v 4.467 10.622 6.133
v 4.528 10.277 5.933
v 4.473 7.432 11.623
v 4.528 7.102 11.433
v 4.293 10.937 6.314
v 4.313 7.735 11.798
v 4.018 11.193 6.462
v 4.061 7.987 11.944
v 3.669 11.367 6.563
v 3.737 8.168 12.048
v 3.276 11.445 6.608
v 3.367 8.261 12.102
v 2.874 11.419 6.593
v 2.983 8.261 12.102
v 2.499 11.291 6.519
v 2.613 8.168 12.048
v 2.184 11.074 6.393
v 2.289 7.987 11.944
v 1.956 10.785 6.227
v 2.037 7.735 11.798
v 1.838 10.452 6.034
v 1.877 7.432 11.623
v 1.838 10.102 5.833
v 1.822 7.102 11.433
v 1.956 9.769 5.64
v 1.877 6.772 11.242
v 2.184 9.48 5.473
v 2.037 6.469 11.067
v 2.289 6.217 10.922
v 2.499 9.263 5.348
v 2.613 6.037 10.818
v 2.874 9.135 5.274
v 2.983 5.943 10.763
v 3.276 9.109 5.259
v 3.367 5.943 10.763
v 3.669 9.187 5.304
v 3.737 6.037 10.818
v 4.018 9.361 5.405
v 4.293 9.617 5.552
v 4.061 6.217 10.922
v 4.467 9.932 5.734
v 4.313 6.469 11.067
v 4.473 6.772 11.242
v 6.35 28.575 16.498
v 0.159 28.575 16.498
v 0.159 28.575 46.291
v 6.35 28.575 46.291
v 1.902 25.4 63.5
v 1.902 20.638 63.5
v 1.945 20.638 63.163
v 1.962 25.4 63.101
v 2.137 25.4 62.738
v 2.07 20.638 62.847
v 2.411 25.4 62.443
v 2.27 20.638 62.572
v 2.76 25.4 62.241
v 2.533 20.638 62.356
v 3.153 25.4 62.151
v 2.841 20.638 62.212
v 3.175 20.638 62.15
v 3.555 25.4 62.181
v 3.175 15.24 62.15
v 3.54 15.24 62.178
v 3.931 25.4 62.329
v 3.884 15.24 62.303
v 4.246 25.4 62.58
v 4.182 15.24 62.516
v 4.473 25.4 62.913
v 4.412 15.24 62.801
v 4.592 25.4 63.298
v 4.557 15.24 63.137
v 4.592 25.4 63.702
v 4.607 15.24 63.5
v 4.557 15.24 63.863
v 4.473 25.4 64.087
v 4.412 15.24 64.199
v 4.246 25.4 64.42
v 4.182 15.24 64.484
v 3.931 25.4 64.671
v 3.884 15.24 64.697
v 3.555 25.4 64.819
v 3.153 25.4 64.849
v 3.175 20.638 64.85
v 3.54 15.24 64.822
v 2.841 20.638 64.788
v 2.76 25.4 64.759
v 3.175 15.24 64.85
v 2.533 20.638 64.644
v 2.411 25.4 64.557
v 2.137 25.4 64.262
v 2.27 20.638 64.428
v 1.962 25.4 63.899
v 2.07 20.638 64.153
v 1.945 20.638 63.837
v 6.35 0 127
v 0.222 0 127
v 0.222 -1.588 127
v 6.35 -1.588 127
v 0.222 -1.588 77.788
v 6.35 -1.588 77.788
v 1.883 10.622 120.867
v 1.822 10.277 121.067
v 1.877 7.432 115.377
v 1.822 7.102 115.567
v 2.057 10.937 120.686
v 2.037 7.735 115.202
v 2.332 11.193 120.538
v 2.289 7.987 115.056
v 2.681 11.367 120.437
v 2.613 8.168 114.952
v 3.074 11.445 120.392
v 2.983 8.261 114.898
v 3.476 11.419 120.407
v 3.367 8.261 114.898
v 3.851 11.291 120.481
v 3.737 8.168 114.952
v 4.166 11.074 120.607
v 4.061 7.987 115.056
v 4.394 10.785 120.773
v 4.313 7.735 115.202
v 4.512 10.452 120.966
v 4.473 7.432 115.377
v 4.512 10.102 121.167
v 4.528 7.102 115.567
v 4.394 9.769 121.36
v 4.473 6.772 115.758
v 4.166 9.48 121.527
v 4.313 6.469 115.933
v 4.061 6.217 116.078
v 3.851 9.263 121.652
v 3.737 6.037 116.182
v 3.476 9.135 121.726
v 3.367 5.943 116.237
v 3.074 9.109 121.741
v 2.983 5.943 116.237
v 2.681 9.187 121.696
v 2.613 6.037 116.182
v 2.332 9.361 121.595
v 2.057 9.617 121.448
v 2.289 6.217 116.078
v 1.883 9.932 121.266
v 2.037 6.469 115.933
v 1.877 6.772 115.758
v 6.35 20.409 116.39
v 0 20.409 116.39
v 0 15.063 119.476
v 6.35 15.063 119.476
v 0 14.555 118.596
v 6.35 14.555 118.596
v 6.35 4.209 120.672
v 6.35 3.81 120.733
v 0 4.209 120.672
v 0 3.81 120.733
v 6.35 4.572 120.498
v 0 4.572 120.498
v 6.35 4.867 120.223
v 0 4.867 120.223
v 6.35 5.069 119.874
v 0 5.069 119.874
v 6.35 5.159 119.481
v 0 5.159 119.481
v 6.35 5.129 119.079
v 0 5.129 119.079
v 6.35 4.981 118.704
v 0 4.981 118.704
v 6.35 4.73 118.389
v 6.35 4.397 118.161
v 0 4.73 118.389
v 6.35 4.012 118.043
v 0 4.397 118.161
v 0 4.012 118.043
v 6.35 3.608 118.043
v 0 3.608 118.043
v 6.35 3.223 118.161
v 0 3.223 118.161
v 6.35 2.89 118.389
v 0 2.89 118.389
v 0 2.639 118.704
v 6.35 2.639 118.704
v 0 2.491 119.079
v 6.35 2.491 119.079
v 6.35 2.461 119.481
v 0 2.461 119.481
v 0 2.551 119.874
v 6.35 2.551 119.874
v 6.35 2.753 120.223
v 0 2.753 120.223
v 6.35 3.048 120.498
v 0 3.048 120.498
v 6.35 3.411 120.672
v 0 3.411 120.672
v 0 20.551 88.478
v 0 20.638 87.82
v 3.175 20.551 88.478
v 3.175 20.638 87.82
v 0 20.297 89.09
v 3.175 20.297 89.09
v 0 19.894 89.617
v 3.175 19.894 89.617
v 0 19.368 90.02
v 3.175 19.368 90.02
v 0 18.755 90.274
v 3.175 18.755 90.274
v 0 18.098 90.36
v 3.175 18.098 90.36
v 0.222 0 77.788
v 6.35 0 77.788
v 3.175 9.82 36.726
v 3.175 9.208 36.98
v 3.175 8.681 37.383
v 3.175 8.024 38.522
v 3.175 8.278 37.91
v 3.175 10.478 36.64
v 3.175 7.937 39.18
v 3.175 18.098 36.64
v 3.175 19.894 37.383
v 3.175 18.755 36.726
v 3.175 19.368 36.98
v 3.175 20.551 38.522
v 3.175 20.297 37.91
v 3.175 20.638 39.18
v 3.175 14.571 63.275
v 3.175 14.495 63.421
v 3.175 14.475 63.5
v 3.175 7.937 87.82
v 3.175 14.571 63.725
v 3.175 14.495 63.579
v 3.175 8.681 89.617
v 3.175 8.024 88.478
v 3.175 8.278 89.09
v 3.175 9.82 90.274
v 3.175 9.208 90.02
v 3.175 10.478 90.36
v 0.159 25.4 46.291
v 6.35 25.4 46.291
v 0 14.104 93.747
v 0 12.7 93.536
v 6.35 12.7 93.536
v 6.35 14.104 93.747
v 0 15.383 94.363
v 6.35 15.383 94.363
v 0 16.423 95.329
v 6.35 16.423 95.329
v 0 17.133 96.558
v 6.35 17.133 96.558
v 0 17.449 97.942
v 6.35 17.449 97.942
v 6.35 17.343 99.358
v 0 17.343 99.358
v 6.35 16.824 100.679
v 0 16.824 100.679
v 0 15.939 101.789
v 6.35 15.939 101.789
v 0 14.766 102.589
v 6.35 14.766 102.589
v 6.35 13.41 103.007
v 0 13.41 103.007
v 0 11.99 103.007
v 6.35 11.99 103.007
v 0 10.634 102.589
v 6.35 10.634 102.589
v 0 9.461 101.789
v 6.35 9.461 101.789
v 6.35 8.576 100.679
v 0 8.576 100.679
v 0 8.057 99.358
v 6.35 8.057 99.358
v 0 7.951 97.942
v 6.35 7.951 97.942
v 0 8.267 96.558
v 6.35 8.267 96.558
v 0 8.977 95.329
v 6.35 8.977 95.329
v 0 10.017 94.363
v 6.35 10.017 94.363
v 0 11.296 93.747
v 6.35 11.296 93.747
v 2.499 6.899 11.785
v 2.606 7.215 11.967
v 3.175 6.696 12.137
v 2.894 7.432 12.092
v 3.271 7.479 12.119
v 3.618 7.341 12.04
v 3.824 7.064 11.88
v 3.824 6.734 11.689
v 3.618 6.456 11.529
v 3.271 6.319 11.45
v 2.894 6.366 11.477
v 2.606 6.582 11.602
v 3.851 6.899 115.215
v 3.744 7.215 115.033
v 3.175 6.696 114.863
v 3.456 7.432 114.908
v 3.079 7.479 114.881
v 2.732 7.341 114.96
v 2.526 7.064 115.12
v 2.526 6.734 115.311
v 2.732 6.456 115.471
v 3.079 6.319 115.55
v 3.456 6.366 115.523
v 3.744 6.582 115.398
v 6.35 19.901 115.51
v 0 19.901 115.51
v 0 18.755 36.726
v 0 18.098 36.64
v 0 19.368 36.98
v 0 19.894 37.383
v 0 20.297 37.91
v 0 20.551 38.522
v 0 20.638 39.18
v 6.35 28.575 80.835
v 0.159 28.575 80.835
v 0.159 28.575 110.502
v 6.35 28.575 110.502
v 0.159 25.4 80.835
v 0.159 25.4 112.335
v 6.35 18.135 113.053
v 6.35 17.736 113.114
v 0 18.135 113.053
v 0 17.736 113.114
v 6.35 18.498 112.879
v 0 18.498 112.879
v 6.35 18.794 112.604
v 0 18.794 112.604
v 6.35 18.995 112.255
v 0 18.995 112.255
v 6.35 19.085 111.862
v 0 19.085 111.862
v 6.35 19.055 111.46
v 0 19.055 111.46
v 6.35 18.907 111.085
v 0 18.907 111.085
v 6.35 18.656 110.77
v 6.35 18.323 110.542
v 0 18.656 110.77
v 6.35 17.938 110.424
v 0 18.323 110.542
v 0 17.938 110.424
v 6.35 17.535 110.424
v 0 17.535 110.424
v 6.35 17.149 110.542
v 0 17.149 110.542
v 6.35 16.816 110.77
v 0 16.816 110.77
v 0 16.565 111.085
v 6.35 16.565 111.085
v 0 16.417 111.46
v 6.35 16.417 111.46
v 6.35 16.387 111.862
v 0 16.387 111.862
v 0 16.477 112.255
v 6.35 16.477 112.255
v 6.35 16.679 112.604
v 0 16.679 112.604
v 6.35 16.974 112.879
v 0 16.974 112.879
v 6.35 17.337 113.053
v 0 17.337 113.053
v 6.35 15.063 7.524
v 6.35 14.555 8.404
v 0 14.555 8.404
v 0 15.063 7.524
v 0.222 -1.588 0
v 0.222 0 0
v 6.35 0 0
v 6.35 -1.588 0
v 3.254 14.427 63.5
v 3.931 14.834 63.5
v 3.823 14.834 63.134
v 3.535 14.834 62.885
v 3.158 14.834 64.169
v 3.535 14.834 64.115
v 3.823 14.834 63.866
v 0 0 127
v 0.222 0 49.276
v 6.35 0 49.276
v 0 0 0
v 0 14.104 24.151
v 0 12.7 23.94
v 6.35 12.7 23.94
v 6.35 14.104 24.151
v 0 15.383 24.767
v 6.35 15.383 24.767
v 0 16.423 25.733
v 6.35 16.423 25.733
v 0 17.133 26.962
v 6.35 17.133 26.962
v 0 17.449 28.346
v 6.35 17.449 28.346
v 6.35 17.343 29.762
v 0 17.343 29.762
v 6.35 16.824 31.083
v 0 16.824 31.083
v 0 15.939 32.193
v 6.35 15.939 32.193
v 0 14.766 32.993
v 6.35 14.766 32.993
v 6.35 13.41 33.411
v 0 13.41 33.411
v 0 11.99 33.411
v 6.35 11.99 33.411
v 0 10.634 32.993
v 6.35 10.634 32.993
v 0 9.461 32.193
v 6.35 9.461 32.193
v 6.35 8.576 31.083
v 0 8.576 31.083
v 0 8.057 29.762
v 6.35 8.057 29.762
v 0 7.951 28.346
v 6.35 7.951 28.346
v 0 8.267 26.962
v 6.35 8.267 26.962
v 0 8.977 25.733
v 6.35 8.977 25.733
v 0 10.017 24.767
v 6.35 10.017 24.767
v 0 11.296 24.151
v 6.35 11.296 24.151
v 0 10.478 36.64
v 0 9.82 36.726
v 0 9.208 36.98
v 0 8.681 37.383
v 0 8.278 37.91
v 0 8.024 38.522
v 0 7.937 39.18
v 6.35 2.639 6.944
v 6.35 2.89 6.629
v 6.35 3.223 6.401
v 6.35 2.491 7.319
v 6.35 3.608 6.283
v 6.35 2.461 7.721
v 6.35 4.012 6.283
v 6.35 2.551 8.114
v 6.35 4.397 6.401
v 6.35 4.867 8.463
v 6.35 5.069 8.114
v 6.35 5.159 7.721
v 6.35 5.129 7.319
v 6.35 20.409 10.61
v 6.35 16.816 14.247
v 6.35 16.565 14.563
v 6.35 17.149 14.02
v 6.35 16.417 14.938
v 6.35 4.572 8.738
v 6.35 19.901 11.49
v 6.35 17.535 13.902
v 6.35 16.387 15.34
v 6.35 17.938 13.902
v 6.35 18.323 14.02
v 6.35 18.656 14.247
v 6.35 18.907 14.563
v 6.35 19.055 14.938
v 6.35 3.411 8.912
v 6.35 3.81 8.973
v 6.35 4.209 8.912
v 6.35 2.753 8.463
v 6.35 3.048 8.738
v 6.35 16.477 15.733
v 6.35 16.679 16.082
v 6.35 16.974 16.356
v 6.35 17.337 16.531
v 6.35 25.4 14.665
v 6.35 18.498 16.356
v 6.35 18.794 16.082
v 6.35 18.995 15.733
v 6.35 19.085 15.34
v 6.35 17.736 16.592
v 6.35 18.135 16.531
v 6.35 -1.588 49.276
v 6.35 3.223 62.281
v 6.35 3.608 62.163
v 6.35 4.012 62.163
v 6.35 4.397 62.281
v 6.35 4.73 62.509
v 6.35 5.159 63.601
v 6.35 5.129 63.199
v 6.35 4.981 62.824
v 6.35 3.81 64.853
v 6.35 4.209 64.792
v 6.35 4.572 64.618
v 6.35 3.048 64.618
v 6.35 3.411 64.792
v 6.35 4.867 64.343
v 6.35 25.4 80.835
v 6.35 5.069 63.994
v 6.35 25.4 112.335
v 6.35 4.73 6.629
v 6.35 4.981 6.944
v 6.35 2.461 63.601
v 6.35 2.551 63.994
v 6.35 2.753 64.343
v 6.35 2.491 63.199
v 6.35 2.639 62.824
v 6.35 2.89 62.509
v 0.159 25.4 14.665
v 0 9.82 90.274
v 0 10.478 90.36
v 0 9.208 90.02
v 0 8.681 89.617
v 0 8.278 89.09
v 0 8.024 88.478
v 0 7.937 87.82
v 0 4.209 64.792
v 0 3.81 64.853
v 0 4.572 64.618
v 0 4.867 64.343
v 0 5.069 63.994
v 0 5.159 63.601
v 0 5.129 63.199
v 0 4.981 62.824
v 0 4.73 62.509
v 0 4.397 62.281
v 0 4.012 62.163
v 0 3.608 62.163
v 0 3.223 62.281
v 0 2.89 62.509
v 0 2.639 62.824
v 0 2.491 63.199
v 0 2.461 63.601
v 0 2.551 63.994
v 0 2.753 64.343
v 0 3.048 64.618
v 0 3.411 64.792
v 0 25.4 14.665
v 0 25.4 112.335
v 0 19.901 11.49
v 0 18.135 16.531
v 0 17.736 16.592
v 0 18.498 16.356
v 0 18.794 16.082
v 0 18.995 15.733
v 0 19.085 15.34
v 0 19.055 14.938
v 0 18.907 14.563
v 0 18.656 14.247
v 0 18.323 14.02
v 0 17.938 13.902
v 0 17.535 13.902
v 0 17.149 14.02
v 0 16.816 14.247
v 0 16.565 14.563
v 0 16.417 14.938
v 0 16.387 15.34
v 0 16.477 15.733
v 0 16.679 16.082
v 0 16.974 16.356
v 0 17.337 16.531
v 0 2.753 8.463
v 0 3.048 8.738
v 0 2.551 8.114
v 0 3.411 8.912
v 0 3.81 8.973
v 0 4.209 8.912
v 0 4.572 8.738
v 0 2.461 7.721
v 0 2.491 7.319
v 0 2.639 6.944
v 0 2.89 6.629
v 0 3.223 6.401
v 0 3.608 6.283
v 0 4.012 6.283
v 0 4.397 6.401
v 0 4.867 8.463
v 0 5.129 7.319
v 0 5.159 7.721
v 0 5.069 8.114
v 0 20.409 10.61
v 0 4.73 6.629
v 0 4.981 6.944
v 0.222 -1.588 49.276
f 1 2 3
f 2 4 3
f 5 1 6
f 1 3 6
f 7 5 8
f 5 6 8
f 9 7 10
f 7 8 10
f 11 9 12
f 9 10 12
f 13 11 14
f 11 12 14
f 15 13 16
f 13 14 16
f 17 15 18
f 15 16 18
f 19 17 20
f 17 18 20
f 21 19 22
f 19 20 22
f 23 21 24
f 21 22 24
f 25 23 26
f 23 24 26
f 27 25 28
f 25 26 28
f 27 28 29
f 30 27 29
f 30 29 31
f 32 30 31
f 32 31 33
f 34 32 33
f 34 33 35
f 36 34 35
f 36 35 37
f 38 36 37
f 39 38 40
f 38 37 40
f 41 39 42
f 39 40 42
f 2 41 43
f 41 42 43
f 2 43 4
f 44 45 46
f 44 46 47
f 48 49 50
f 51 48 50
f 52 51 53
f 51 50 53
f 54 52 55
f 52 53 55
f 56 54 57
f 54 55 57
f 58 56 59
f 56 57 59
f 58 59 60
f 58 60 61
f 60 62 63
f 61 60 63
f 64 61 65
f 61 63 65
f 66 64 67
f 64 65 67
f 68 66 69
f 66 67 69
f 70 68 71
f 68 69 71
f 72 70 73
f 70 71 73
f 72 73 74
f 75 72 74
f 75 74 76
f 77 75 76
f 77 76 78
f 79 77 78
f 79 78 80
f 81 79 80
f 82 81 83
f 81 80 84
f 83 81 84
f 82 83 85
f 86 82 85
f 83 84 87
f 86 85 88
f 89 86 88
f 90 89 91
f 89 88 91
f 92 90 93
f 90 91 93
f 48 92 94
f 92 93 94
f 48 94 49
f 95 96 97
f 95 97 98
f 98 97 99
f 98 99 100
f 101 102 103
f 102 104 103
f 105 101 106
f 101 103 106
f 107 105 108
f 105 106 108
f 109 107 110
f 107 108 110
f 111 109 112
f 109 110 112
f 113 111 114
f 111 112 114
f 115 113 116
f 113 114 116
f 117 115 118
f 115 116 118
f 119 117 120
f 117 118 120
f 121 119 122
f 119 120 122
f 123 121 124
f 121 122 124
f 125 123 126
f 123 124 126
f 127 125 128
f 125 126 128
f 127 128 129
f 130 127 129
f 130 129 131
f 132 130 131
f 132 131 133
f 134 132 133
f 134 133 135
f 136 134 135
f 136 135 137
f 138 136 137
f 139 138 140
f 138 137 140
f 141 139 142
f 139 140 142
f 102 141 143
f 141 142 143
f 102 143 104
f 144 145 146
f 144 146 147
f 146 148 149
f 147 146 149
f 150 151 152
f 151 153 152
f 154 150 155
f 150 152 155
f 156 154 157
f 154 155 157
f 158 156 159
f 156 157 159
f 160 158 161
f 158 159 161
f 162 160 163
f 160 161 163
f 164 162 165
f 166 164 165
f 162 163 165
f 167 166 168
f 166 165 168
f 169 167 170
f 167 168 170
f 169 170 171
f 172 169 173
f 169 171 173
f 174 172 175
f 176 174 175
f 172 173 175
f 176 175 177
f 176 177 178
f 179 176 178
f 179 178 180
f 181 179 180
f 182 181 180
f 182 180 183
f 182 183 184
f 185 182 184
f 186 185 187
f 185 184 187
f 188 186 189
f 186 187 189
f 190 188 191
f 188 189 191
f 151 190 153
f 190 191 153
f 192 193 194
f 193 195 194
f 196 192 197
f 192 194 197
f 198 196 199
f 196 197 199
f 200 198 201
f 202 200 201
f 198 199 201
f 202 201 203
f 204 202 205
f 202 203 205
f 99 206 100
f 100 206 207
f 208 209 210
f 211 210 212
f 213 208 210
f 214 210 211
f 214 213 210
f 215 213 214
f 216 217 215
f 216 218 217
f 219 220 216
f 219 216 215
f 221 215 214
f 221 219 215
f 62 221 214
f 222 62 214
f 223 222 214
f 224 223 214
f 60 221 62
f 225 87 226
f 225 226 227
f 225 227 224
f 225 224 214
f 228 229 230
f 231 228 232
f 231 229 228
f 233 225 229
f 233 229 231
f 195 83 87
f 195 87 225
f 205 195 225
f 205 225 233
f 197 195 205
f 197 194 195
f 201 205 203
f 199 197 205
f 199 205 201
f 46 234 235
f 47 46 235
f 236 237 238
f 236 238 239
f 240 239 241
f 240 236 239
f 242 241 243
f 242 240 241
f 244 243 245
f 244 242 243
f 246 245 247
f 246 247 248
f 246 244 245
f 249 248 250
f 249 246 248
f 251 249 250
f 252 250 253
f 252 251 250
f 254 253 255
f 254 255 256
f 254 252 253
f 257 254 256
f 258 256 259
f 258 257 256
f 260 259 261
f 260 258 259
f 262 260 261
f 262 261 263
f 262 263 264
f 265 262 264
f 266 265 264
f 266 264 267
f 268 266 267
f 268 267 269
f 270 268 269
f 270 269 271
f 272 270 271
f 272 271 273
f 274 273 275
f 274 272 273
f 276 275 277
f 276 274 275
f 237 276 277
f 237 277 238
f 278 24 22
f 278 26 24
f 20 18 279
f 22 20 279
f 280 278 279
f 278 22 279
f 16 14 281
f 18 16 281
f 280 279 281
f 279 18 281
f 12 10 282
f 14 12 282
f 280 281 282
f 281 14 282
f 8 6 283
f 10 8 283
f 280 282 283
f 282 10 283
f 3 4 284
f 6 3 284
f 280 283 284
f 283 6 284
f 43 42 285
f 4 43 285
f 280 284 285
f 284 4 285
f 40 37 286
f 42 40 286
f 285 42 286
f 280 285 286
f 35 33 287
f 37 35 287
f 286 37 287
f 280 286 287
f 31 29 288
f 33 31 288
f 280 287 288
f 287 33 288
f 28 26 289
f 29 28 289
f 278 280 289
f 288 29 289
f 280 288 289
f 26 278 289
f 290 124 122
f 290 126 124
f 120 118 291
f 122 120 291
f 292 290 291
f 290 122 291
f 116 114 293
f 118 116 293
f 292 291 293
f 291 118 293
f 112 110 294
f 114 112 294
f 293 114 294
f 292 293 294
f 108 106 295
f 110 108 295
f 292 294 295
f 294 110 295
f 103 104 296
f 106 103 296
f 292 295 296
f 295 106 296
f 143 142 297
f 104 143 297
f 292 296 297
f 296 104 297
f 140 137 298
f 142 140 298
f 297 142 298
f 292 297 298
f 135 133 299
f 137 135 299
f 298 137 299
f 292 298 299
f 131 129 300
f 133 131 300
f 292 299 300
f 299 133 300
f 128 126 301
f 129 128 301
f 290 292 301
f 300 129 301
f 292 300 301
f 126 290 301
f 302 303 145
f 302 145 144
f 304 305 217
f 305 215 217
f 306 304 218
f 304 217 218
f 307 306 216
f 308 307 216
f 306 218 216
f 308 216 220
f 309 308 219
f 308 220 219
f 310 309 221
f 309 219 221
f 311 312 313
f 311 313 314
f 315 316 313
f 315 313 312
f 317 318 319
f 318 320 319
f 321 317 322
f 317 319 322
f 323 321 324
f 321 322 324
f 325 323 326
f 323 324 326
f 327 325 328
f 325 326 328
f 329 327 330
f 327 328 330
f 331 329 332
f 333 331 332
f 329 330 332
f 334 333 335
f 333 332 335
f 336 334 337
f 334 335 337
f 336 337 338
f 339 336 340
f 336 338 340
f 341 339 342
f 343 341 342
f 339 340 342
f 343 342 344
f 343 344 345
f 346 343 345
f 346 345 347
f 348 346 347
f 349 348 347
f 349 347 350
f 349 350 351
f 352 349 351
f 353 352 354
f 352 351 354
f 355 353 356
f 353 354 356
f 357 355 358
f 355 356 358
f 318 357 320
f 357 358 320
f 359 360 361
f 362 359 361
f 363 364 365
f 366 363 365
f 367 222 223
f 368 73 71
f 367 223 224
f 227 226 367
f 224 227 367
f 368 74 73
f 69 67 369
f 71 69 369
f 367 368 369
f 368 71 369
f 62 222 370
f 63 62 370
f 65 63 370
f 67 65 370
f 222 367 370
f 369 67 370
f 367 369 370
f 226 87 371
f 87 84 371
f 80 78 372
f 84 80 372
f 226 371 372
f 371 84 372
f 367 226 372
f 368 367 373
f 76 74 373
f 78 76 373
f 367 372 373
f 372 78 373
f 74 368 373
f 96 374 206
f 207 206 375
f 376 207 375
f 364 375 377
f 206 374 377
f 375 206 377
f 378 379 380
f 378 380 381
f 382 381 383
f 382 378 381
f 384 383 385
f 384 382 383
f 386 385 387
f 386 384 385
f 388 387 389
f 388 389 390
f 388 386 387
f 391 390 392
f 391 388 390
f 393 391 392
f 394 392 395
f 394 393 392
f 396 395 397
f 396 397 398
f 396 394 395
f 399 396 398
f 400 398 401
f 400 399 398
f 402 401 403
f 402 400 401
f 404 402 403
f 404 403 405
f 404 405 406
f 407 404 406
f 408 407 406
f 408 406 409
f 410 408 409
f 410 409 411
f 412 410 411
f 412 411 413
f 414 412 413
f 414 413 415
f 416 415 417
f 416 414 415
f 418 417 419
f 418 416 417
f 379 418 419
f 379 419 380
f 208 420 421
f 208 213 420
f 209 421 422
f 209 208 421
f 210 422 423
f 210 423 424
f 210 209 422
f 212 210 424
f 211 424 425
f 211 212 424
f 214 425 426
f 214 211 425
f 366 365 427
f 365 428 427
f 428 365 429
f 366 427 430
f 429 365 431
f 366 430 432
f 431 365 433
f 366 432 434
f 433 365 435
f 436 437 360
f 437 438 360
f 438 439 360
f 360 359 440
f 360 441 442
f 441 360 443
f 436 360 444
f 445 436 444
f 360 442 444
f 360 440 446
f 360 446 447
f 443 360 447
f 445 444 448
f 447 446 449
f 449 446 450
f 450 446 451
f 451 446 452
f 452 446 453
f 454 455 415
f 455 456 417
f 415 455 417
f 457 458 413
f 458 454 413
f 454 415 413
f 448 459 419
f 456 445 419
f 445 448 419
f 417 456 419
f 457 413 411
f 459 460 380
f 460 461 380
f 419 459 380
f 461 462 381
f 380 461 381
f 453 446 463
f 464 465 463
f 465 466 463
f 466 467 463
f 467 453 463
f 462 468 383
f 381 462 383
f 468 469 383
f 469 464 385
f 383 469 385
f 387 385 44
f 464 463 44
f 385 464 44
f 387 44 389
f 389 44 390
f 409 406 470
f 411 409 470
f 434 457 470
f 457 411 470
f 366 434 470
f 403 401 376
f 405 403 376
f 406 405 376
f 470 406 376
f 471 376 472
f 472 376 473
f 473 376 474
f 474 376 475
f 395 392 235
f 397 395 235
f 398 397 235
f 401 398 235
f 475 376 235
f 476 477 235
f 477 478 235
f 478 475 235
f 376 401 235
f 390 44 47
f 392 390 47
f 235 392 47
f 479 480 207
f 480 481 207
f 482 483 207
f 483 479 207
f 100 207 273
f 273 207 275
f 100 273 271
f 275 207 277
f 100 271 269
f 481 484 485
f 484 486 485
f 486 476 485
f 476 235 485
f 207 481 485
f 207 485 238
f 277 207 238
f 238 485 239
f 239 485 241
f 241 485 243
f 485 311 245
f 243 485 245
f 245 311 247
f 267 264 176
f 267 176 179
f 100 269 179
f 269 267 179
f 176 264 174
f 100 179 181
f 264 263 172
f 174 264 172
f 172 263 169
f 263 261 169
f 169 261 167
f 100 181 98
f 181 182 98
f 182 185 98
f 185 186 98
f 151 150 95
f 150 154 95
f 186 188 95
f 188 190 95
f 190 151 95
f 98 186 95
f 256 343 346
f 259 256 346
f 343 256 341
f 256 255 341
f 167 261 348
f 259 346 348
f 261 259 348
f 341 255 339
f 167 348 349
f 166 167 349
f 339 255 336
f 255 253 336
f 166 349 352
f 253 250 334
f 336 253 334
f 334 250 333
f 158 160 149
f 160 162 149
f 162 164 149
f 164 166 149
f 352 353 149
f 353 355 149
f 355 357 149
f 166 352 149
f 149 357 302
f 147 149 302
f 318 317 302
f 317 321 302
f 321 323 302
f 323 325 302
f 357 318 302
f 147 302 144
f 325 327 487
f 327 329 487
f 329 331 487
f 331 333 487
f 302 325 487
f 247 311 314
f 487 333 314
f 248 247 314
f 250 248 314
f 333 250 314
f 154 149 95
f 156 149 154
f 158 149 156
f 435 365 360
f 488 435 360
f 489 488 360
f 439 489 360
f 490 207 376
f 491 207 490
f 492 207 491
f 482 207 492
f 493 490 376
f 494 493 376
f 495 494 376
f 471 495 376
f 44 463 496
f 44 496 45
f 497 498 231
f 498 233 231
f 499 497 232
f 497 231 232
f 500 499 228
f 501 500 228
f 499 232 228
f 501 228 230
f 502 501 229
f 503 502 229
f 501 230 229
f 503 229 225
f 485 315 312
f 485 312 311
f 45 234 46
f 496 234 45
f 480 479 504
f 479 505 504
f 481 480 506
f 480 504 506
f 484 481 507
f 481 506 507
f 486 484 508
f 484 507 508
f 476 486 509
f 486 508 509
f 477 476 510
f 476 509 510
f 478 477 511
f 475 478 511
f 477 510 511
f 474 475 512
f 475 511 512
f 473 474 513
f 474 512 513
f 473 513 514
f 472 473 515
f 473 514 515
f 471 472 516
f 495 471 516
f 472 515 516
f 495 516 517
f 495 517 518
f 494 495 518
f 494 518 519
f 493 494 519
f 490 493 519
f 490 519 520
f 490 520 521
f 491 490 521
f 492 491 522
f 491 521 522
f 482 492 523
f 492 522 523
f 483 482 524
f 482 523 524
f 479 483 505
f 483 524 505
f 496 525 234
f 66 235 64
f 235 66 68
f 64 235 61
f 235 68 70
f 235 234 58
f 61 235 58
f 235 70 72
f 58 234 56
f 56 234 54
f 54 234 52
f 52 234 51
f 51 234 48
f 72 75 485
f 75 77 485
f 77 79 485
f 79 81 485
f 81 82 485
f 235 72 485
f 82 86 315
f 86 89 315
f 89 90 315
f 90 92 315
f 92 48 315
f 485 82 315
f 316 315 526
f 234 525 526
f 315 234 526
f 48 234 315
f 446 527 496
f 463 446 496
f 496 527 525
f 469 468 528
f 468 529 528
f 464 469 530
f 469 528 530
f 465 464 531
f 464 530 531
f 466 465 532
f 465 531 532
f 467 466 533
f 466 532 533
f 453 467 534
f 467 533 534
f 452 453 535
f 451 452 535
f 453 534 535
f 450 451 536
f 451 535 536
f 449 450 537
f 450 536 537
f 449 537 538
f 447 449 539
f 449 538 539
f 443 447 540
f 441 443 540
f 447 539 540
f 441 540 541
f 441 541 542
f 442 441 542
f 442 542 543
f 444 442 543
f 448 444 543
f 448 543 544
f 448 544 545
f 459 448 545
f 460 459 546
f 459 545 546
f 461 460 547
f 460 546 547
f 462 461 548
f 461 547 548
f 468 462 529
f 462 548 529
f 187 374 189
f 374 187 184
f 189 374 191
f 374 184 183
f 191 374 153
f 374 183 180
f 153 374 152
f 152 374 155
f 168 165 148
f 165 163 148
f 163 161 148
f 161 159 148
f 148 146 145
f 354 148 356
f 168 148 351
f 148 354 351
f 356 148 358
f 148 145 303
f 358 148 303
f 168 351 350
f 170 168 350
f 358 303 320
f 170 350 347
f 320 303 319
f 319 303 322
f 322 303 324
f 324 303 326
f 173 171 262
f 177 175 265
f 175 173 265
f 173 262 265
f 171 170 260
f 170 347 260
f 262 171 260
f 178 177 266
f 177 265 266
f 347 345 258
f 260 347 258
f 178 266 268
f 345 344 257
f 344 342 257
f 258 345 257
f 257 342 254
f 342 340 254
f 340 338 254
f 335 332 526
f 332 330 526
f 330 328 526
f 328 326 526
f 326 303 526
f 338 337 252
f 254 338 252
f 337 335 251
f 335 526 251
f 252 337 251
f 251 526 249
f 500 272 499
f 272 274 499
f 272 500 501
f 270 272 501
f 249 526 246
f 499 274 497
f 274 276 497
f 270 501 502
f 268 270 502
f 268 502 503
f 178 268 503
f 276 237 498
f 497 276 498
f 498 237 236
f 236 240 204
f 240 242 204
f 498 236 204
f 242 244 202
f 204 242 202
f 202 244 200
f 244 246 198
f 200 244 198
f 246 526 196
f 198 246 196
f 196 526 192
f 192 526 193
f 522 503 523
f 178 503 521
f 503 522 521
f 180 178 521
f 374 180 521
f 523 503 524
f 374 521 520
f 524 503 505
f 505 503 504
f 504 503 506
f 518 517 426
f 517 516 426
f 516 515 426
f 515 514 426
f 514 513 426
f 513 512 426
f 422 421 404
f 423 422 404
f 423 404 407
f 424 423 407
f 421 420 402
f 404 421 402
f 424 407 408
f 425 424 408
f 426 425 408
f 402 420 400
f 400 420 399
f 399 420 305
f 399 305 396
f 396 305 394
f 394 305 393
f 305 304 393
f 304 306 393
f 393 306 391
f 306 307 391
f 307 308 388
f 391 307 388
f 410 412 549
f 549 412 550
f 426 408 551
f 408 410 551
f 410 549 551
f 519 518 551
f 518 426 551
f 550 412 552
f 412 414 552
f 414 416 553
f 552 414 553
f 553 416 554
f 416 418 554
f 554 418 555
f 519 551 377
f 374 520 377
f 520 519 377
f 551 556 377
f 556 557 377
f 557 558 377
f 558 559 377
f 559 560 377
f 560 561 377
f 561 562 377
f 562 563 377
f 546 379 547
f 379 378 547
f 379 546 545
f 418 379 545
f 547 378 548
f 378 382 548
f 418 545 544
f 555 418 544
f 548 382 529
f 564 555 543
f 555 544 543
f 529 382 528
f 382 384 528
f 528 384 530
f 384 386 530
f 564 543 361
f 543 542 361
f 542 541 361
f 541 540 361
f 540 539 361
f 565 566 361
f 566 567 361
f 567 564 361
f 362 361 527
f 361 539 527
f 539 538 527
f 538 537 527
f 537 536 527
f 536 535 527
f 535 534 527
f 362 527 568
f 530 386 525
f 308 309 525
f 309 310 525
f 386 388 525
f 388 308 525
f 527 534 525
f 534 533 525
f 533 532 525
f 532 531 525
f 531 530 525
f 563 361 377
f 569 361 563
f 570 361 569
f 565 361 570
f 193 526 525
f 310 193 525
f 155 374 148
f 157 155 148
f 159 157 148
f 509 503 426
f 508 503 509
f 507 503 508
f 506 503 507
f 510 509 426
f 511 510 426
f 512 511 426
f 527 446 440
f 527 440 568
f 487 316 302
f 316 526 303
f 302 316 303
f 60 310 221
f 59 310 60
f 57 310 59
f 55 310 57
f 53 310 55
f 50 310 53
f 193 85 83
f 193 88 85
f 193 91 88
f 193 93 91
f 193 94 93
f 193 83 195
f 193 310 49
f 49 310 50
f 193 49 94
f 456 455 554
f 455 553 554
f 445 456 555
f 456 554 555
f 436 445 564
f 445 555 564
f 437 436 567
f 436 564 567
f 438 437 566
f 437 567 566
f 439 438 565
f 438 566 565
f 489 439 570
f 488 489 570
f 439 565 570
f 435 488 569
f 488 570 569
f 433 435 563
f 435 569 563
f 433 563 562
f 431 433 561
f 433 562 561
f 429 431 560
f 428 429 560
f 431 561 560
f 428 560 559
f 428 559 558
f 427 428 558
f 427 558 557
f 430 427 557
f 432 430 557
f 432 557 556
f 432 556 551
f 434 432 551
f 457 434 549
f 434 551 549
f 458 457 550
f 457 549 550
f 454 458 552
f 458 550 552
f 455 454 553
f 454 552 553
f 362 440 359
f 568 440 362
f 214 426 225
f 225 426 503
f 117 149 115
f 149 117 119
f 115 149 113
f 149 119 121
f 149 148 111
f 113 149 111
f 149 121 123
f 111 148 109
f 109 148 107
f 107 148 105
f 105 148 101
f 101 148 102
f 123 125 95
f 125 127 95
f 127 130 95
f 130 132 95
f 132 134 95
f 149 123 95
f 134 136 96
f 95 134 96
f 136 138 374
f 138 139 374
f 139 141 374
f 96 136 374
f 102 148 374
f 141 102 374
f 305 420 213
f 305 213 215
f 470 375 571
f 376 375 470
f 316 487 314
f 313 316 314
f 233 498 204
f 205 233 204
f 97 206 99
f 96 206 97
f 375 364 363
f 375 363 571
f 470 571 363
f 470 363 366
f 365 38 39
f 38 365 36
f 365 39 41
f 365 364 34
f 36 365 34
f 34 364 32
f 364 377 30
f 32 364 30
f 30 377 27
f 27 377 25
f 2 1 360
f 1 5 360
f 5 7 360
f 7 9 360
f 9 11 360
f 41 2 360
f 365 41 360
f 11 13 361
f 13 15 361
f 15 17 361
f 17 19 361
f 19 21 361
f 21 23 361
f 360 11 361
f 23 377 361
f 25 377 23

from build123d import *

# Parameters (mm, degrees)
SKETCH1_R                     = 4.7625
BOSS_EXTRUDE1_DEPTH           = 6.35
SKETCH7_W                     = 6.35
SKETCH7_H                     = 6.1722
BOSS_EXTRUDE2_DEPTH           = 1.016
SKETCH8_W                     = 6.35
SKETCH8_H                     = 6.1722
BOSS_EXTRUDE3_DEPTH           = 1.016
TAP_DRILL_FOR_6_32_TAP1_D     = 2.7051
TAP_DRILL_FOR_6_32_TAP1_DEPTH = 6.35
TAP_DRILL_FOR_6_32_TAP1_TIP   = 0.81269403
TAP_DRILL_FOR_6_32_TAP2_D     = 2.7051
TAP_DRILL_FOR_6_32_TAP2_DEPTH = 6.35
TAP_DRILL_FOR_6_32_TAP2_TIP   = 0.81269403
TAP_DRILL_FOR_6_32_TAP3_D     = 2.7051
TAP_DRILL_FOR_6_32_TAP3_DEPTH = 6.35
TAP_DRILL_FOR_6_32_TAP3_TIP   = 0.81269403
SKETCH18_W                    = 53.721
SKETCH18_H                    = 12.7
CUT_EXTRUDE1_DEPTH            = 3.175
FILLET1_R                     = 2.54
SKETCH19_W                    = 6.19125
SKETCH19_H                    = 31.625875518
SKETCH19_H_2                  = 31.500730808
BOSS_EXTRUDE4_DEPTH           = 3.175
CUT_EXTRUDE2_DEPTH            = 131.329786024
TAP_DRILL_FOR_6_32_TAP4_D     = 2.7051
TAP_DRILL_FOR_6_32_TAP4_DEPTH = 10.16
TAP_DRILL_FOR_6_32_TAP4_TIP   = 0.81269403
SKETCH23_W                    = 6.12775
SKETCH23_H                    = 49.2125
SKETCH23_H_2                  = 49.276
BOSS_EXTRUDE5_DEPTH           = 1.5875


with BuildPart() as part:
    # Sketch1 → Boss-Extrude1 (new body)
    with BuildSketch(Plane(origin=(0, 0, 0), x_dir=(0, 0, -1), z_dir=(1, 0, 0))):
        Polygon((0, 0), (-14.664696837, 25.4), (-112.335303163, 25.4), (-127, 0), align=None)
        with Locations((-98.298, 12.7)):
            Circle(SKETCH1_R, mode=Mode.SUBTRACT)
        with Locations((-28.702, 12.7)):
            Circle(SKETCH1_R, mode=Mode.SUBTRACT)
    extrude(amount=BOSS_EXTRUDE1_DEPTH)

    # Sketch7 → Boss-Extrude2 (add)
    with BuildSketch(Plane(origin=(0, 0, 0), x_dir=(-1, 0, 0), z_dir=(0, 0.499999999999998, -0.8660254037844397))):
        with Locations((-3.175, 19.893293675)):
            Rectangle(SKETCH7_W, SKETCH7_H)
    extrude(amount=BOSS_EXTRUDE2_DEPTH)

    # Sketch8 → Boss-Extrude3 (add)
    with BuildSketch(Plane(origin=(0, 54.99261314, 95.25), x_dir=(1, 0, 0), z_dir=(0, 0.500000000000004, 0.8660254037844365))):
        with Locations((3.175, -43.606706325)):
            Rectangle(SKETCH8_W, SKETCH8_H)
    extrude(amount=BOSS_EXTRUDE3_DEPTH)

    # Tap Drill for #6-32 Tap1
    with Locations(Plane(origin=(6.35, 0, 0), x_dir=(0, 0, -1), z_dir=(1, 0, 0))):
        with Locations((-111.761034973, 17.736097687), (-15.238965027, 17.736097687), (-119.38, 3.81), (-7.62, 3.81), (-63.5, 3.81)):
            Hole(TAP_DRILL_FOR_6_32_TAP1_D / 2, depth=TAP_DRILL_FOR_6_32_TAP1_DEPTH)
            with Locations((0, 0, -(TAP_DRILL_FOR_6_32_TAP1_DEPTH + TAP_DRILL_FOR_6_32_TAP1_TIP / 2))):  # 118° drill point
                Cone(0, TAP_DRILL_FOR_6_32_TAP1_D / 2, TAP_DRILL_FOR_6_32_TAP1_TIP, mode=Mode.SUBTRACT)

    # Tap Drill for #6-32 Tap2
    with Locations(Plane(origin=(0, 54.99261314, 95.25), x_dir=(1, 0, 0), z_dir=(0, 0.500000000000004, 0.8660254037844365))):
        with Locations((3.175, -51.633106325)):
            Hole(TAP_DRILL_FOR_6_32_TAP2_D / 2, depth=TAP_DRILL_FOR_6_32_TAP2_DEPTH)
            with Locations((0, 0, -(TAP_DRILL_FOR_6_32_TAP2_DEPTH + TAP_DRILL_FOR_6_32_TAP2_TIP / 2))):  # 118° drill point
                Cone(0, TAP_DRILL_FOR_6_32_TAP2_D / 2, TAP_DRILL_FOR_6_32_TAP2_TIP, mode=Mode.SUBTRACT)

    # Tap Drill for #6-32 Tap3
    with Locations(Plane(origin=(0, 0, 0), x_dir=(-1, 0, 0), z_dir=(0, 0.49999999999999806, -0.8660254037844398))):
        with Locations((-3.175, 11.866893675)):
            Hole(TAP_DRILL_FOR_6_32_TAP3_D / 2, depth=TAP_DRILL_FOR_6_32_TAP3_DEPTH)
            with Locations((0, 0, -(TAP_DRILL_FOR_6_32_TAP3_DEPTH + TAP_DRILL_FOR_6_32_TAP3_TIP / 2))):  # 118° drill point
                Cone(0, TAP_DRILL_FOR_6_32_TAP3_D / 2, TAP_DRILL_FOR_6_32_TAP3_TIP, mode=Mode.SUBTRACT)

    # Sketch18 → Cut-Extrude1 (cut)
    with BuildSketch(Plane.ZY):
        with Locations((63.5, 14.2875)):
            Rectangle(SKETCH18_W, SKETCH18_H)
    extrude(amount=-CUT_EXTRUDE1_DEPTH, mode=Mode.SUBTRACT)

    # Fillet1
    fillet1_edges = [part.edges().sort_by_distance(p)[0] for p in [
        (1.5875, 7.9375, 36.6395),
        (1.5875, 20.6375, 36.6395),
        (1.5875, 20.6375, 90.3605),
        (1.5875, 7.9375, 90.3605),
    ]]
    fillet(fillet1_edges, radius=FILLET1_R)

    # Sketch19 → Boss-Extrude4 (add)
    with BuildSketch(Plane(origin=(0, 25.4, 0), x_dir=(1, 0, 0), z_dir=(0, 1, 0))):
        with Locations((3.254375, -30.477634596)):
            Rectangle(SKETCH19_W, SKETCH19_H)
        with Locations((3.254375, -96.584937759)):
            Rectangle(SKETCH19_W, SKETCH19_H_2)
    extrude(amount=BOSS_EXTRUDE4_DEPTH)

    # Sketch20 → Cut-Extrude2 (cut, through all)
    with BuildSketch(Plane(origin=(6.35, 0, 0), x_dir=(0, 0, -1), z_dir=(1, 0, 0))):
        Polygon((-112.335303163, 25.4), (-110.502216058, 28.575), (-112.335303163, 28.575), align=None)
        Polygon((-14.664696837, 25.4), (-16.497783942, 28.575), (-14.664696837, 28.575), align=None)
    extrude(amount=-CUT_EXTRUDE2_DEPTH, mode=Mode.SUBTRACT)

    # Tap Drill for #6-32 Tap4
    with Locations(Plane(origin=(0, 25.4, 0), x_dir=(1, 0, 0), z_dir=(0, 1, 0))):
        with Locations((3.254375, -63.5)):
            Hole(TAP_DRILL_FOR_6_32_TAP4_D / 2, depth=TAP_DRILL_FOR_6_32_TAP4_DEPTH)
            with Locations((0, 0, -(TAP_DRILL_FOR_6_32_TAP4_DEPTH + TAP_DRILL_FOR_6_32_TAP4_TIP / 2))):  # 118° drill point
                Cone(0, TAP_DRILL_FOR_6_32_TAP4_D / 2, TAP_DRILL_FOR_6_32_TAP4_TIP, mode=Mode.SUBTRACT)

    # Sketch23 → Boss-Extrude5 (add)
    with BuildSketch(Plane.XZ):
        with Locations((3.286125, 102.39375)):
            Rectangle(SKETCH23_W, SKETCH23_H)
        with Locations((3.286125, 24.638)):
            Rectangle(SKETCH23_W, SKETCH23_H_2)
    extrude(amount=BOSS_EXTRUDE5_DEPTH)


solid = part.part
